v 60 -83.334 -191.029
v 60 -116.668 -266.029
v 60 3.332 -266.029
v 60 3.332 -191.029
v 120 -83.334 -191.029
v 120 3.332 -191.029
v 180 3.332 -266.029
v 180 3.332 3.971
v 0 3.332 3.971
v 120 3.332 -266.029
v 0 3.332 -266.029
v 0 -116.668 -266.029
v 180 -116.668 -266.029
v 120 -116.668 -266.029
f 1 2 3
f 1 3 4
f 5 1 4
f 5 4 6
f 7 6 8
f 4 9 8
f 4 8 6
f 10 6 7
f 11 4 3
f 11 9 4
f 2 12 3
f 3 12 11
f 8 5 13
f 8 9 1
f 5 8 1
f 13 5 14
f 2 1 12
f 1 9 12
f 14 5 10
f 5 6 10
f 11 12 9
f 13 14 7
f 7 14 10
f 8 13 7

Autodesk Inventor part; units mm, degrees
ref_plane "YZ Plane" through (0, 0, 0) normal (1, 0, 0) x (0, 1, 0)
ref_plane "XZ Plane" through (0, 0, 0) normal (0, 1, 0) x (-1, 0, 0)
ref_plane "XY Plane" through (0, 0, 0) normal (0, 0, 1) x (1, 0, 0)
sketch "Sketch1" plane through (0, 0, 0) normal (0, 0, 1) x (1, 0, 0)
  point P0 (0, 0)
sketch "Sketch2" plane through (0, 0, 0) normal (1, 0, 0) x (0, 1, 0)
  line L0 (3.3322, 3.9709) -> (123.3322, 3.9709) construction
  line L1 (3.3322, 3.9709) -> (3.3322, -266.0291)
  line L2 (-116.6678, -266.0291) -> (3.3322, -266.0291)
  line L3 (3.3322, 3.9709) -> (-116.6678, -266.0291)
  point P0 (0, 0)
  dimension "d6" = 270
extrude "Extrusion1" add sketch "Sketch2" along normal blind 180
sketch "Sketch3" plane through (0, 3.3322, 3.9709) normal (0, 1, 0) x (1, 0, 0)
  line L0 (0, 0) -> (0, 270) projected
  line L1 (0, 270) -> (60, 270)
  line L2 (0, 270) -> (180, 270) projected
  line L3 (60, 270) -> (120, 270)
  line L4 (120, 270) -> (180, 270)
  line L5 (60, 270) -> (60, 195)
  line L6 (60, 195) -> (120, 195)
  line L7 (120, 195) -> (120, 270)
  point P0 (0, 3.9709)
  dimension "d7" = 60
  dimension "d8" = 60
  dimension "d9" = 75
extrude "Extrusion2" cut sketch "Sketch3" against normal blind 191.475
properties part number "Tapered"
